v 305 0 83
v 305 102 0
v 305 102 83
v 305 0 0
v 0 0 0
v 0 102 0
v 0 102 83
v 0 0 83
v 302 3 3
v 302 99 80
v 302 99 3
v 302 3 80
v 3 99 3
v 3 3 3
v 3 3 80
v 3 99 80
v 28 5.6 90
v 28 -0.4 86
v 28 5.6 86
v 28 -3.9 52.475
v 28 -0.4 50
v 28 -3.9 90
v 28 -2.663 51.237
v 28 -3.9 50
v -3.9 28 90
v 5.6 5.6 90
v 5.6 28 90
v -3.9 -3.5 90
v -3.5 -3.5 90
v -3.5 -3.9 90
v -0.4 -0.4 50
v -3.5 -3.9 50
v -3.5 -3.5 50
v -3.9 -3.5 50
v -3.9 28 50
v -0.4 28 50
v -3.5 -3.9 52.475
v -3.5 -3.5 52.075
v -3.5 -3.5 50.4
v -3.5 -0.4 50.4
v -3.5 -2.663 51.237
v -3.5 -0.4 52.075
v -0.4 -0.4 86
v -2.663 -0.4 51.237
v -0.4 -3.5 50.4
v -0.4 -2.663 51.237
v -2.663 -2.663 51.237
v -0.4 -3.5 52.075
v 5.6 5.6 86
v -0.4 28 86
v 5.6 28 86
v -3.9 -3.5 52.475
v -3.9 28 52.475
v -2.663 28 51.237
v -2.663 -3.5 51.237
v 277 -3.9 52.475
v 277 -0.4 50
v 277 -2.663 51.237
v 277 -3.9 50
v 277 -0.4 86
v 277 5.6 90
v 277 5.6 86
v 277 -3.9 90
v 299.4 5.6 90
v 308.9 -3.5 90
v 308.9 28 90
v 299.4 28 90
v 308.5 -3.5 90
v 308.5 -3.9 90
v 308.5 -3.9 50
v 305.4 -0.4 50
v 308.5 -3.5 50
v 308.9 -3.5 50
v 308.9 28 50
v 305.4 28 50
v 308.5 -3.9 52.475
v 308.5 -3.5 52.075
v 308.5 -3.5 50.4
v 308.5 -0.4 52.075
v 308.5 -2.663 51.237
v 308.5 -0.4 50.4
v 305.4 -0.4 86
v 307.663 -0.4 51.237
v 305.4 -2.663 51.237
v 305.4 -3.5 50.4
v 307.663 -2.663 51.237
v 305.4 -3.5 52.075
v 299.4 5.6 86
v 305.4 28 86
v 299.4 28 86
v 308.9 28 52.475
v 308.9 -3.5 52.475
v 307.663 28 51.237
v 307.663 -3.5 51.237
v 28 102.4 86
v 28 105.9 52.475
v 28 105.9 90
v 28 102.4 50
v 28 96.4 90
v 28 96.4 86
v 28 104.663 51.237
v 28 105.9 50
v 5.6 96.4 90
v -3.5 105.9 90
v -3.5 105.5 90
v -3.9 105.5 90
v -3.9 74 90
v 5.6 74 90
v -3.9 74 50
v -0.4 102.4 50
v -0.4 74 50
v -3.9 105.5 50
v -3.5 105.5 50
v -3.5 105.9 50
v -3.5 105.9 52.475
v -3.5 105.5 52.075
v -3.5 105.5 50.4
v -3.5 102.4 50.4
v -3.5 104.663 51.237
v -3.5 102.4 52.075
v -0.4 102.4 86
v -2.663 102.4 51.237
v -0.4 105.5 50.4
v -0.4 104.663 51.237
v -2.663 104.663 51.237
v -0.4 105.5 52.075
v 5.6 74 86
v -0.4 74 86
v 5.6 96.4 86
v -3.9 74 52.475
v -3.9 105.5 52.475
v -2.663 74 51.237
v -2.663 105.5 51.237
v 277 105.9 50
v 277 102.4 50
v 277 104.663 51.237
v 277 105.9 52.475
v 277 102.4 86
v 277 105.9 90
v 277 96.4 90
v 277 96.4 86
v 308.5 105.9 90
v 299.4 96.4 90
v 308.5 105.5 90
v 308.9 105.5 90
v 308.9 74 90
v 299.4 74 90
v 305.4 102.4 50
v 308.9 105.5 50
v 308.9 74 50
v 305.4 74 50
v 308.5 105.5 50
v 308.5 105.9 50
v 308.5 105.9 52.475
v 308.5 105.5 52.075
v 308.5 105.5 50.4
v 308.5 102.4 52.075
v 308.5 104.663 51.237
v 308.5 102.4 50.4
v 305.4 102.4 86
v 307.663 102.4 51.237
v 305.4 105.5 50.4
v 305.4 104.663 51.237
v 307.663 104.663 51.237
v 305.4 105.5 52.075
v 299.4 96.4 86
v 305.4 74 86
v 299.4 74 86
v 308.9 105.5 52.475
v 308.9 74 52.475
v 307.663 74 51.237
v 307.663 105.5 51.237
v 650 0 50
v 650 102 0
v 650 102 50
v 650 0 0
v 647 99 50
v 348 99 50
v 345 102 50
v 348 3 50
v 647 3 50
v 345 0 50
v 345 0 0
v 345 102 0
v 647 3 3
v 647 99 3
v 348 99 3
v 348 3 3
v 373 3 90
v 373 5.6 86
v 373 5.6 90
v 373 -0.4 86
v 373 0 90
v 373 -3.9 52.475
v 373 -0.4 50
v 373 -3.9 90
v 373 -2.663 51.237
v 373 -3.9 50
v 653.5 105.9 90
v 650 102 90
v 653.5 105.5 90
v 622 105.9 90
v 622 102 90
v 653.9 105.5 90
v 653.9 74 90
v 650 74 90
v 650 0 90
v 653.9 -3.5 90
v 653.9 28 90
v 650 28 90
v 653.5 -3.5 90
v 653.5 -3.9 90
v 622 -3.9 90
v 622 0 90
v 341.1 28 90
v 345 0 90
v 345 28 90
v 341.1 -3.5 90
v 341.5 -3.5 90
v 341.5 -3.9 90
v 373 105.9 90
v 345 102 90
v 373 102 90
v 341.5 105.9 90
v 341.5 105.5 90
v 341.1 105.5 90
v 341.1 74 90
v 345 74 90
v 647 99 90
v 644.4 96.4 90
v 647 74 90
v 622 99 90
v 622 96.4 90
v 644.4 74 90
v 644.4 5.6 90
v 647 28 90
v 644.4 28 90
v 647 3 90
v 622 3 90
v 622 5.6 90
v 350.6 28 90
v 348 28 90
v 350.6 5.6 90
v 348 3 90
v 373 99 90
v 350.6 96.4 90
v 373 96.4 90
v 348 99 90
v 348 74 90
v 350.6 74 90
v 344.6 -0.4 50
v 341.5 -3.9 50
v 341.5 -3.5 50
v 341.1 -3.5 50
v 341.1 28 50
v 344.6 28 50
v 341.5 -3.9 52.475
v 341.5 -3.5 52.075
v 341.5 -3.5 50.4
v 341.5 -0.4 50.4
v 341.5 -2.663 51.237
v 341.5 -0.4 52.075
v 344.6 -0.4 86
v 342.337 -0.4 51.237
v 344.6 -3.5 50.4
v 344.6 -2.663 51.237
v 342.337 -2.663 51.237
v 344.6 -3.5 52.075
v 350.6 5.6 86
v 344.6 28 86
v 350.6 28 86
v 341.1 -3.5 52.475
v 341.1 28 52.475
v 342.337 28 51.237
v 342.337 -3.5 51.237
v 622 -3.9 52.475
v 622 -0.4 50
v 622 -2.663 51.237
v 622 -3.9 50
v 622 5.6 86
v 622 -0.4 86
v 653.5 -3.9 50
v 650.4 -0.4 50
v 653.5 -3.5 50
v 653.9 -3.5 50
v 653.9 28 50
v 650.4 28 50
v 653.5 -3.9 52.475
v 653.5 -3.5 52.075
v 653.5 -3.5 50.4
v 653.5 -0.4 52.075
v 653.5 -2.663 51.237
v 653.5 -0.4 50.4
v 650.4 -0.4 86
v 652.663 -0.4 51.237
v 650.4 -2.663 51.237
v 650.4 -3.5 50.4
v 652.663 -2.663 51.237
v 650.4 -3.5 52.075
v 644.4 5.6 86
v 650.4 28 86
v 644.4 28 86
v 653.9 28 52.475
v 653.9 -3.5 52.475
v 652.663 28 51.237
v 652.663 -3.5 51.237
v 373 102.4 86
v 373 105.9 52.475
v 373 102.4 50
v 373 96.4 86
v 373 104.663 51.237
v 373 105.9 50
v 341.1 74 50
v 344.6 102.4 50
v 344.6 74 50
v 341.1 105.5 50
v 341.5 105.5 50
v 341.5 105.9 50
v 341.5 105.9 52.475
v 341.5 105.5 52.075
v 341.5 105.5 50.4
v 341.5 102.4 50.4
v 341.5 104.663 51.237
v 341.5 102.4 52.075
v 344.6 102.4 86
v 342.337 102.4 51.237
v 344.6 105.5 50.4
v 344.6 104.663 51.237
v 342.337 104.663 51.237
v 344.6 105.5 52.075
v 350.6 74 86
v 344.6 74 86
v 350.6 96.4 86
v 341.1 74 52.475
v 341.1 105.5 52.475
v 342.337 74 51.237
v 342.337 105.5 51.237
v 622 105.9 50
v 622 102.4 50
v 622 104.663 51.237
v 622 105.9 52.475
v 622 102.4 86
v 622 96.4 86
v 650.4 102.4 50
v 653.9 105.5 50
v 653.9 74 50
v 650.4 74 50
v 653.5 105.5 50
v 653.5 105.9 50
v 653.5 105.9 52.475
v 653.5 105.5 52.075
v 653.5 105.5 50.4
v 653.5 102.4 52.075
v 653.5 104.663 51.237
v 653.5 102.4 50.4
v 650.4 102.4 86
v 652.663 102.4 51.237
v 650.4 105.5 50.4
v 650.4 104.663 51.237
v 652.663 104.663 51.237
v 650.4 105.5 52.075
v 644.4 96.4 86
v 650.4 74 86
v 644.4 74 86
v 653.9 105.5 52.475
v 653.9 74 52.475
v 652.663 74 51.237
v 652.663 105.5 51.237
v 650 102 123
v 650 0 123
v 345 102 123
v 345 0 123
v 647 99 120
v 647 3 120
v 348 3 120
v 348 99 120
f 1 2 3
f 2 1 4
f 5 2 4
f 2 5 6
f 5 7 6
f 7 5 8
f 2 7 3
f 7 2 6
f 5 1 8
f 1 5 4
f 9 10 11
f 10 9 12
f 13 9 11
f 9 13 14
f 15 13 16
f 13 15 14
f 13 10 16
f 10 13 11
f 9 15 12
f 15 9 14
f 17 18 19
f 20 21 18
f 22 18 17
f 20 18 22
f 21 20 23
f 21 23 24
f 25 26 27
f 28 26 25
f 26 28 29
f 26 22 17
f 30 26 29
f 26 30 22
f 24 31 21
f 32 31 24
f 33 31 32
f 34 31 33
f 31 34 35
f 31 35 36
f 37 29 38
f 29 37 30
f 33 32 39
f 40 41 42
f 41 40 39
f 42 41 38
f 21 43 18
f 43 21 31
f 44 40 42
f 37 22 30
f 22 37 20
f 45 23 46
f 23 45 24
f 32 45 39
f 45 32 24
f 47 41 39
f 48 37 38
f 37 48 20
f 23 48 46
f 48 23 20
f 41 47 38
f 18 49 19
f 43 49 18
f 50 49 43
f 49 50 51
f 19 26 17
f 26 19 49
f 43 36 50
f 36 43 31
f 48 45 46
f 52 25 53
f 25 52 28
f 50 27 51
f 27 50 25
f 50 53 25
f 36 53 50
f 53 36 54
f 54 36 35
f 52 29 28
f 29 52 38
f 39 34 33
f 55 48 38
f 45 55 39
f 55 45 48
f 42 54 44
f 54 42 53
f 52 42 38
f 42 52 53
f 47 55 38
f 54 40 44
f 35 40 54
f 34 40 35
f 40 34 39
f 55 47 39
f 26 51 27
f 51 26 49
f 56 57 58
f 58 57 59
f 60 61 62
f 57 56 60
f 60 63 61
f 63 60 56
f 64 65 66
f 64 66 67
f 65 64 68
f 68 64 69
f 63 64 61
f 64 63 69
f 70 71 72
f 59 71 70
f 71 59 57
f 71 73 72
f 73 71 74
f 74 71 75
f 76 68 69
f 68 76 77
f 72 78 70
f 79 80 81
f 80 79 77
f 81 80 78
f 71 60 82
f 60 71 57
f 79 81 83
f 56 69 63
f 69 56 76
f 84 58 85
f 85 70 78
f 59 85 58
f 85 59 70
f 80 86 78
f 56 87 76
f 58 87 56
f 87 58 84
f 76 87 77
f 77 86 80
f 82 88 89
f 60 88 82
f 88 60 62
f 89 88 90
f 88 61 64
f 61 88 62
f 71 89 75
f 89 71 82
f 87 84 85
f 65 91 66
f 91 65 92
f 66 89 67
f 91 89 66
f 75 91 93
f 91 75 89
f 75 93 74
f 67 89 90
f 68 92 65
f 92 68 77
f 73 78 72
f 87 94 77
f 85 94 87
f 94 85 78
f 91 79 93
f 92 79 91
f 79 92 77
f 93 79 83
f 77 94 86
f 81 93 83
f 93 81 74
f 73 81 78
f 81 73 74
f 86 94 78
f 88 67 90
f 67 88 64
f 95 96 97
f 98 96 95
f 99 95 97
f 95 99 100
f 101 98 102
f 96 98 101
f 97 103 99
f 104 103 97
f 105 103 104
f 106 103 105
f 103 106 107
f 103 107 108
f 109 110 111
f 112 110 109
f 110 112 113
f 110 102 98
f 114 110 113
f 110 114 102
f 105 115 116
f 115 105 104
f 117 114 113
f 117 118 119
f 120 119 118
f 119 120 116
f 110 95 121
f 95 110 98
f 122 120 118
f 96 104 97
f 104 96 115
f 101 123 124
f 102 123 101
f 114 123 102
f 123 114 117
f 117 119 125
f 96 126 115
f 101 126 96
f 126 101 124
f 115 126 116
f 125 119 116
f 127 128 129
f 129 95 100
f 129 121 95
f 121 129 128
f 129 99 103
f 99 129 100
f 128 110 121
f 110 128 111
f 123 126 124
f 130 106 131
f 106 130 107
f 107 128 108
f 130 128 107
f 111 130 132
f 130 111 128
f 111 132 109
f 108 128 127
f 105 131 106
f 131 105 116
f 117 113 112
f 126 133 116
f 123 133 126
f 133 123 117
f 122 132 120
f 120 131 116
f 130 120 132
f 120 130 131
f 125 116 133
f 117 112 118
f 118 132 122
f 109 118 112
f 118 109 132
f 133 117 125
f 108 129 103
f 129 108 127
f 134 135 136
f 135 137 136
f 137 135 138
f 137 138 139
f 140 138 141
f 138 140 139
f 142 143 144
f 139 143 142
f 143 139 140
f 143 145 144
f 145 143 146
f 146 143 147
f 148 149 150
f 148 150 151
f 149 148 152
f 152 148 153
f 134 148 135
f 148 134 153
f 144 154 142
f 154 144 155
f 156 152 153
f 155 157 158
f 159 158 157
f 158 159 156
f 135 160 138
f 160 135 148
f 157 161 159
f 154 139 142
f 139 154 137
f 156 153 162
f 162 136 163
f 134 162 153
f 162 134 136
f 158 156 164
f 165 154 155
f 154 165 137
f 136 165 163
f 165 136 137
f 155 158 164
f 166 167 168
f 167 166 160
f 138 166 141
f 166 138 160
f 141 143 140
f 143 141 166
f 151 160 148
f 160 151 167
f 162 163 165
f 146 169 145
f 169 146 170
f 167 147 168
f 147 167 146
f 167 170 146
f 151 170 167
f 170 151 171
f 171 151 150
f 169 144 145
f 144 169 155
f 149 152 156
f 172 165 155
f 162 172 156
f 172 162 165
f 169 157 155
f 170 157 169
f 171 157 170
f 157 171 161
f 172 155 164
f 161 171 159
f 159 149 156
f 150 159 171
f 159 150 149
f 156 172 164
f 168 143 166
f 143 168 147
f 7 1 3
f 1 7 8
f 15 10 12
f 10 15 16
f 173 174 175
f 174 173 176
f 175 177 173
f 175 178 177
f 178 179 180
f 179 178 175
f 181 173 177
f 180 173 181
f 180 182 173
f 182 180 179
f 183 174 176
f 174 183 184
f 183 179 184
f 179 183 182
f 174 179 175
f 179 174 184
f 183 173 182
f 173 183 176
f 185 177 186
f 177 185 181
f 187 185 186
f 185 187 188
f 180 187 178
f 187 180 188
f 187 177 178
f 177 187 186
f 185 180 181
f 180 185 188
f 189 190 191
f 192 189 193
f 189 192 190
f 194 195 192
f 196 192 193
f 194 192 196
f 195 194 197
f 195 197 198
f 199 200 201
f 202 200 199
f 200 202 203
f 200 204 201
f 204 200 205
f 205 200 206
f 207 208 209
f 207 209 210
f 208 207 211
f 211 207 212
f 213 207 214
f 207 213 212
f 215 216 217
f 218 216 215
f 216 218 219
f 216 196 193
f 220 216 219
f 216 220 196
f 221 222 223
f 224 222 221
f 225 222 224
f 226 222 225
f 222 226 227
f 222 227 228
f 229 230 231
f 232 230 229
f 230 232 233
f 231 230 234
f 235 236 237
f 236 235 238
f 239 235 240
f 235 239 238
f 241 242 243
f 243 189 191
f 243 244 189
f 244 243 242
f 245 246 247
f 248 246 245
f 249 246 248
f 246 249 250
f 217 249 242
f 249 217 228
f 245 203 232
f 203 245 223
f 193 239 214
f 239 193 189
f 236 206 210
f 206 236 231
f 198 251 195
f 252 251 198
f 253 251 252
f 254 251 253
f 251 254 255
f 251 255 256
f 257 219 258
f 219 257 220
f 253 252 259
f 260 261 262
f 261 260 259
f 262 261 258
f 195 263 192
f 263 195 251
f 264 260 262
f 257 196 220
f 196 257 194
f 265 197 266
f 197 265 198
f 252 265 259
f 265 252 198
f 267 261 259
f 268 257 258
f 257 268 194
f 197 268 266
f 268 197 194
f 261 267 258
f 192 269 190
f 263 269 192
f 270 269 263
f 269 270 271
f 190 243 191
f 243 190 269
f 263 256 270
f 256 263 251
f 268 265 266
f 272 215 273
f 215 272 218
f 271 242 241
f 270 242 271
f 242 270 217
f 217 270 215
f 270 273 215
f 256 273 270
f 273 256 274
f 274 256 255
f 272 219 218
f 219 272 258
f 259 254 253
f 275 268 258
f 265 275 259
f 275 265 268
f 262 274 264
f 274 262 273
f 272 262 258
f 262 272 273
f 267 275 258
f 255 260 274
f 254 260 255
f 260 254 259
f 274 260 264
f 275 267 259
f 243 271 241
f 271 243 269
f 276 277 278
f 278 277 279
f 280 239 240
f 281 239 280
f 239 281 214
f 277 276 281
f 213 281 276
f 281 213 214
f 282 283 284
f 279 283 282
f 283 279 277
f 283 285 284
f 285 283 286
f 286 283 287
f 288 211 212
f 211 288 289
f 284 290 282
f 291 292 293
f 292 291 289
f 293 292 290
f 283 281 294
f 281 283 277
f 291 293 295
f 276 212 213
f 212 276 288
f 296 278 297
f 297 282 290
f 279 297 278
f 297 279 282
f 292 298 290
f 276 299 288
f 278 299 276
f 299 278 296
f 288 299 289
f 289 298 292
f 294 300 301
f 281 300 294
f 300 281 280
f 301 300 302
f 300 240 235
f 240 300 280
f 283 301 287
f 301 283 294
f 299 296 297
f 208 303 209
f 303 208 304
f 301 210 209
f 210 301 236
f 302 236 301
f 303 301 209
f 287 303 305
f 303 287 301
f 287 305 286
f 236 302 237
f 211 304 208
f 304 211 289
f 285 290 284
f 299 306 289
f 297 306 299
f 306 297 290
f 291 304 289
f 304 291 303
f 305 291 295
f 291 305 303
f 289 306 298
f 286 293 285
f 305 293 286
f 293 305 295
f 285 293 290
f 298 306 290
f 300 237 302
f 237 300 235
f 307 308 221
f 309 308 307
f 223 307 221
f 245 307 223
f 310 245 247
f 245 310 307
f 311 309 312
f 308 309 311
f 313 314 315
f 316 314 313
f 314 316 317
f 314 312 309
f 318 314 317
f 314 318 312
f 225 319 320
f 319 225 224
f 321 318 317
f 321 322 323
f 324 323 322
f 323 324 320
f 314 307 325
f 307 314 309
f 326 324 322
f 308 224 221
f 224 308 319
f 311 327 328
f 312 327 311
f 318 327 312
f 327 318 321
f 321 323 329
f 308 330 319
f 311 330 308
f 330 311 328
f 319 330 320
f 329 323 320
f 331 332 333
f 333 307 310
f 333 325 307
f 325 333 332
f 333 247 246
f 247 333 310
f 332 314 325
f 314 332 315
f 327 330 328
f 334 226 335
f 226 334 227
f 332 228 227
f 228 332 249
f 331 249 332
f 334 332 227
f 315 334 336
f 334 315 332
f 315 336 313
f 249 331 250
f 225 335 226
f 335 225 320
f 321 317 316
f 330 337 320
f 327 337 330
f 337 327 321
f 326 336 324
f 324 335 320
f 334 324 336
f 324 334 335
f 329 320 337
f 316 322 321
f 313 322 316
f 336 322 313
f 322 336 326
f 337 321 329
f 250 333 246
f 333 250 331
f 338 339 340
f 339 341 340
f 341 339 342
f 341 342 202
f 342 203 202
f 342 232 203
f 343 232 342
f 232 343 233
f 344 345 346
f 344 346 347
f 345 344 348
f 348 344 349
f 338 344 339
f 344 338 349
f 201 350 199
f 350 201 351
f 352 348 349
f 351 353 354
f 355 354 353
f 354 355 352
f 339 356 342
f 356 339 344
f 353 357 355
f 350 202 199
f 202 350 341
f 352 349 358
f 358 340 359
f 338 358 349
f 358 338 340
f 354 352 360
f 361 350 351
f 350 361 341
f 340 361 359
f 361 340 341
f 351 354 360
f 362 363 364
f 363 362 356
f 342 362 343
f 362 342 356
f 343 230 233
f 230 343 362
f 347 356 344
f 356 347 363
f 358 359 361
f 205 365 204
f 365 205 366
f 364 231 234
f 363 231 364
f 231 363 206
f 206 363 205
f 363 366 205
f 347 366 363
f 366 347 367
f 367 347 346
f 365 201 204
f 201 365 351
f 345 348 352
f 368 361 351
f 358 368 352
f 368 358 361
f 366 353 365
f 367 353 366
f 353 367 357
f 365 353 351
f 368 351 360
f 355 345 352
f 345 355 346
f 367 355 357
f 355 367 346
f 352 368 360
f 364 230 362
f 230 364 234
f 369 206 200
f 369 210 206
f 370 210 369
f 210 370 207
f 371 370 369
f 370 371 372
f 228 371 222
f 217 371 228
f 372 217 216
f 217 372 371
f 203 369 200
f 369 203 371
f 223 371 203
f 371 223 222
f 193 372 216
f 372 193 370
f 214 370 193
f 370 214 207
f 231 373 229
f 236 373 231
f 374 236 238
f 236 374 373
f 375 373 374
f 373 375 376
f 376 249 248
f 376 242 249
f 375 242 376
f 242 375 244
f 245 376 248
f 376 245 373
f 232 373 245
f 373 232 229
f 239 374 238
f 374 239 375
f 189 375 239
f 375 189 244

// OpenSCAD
// 02_corner_clips.scad
// RETROFIT: Four L-shaped corner clips integral to the NEW tray.
// Each clip wraps around ONE corner of the top tray (grabbing two outer faces)
// and projects a horizontal shelf that hooks OVER the top rim at z=83.
// Engagement: push top tray straight down — clips flex slightly then snap.
// Release: squeeze opposing corner pairs inward slightly, lift top tray.
// TOP TRAY FIXED — NO geometry added to it.
//
// LEFT: ENGAGED  |  RIGHT: EXPLODED

TW = 305; TD = 102; TH = 33;
NW = 305; ND = 102; NH = 50;
wall = 3;

// clip geometry
cl_leg   = 28;   // length of each L-leg along the tray edge
cl_t     = 3.5; // clip arm wall thickness
cl_h     = TH + 7;  // clip height above z=NH (must clear top tray TH=33)
lip_ext  = 6;   // rim lip horizontal reach inward
lip_t    = 4;   // rim lip vertical thickness
gap      = 0.4; // clearance between clip inner face and top tray outer face
// lead-in chamfer on clip inner bottom edge (aids snap-in)
chamfer  = 3;

C_new  = "#1565C0";
C_top  = "#90A4AE";
C_clip = "#C62828";  // deep red — corner clips

sep = NW + 40;

module new_tray_body() {
    color(C_new)
    difference() {
        cube([NW, ND, NH]);
        translate([wall, wall, wall])
            cube([NW-2*wall, ND-2*wall, NH]);
    }
}

module top_tray_body(dz=0) {
    color(C_top)
    translate([0, 0, NH + dz])
    difference() {
        cube([TW, TD, TH]);
        translate([wall, wall, 0])
            cube([TW-2*wall, TD-2*wall, TH-wall]);
    }
}

// Single L-clip, placed at the x=0,y=0 corner.
// The L wraps: one arm along +X (covering front face y<0),
//              one arm along +Y (covering left face x<0).
// Both arms have a rim-lip at the top.
module corner_clip() {
    color(C_clip)
    union() {
        // X-arm: covers outside of front face (y=0) for length cl_leg
        // outer face of arm at y = -(gap + cl_t), inner face at y = -gap
        translate([-cl_t, -(cl_t + gap), 0]) {
            difference() {
                cube([cl_leg + cl_t, cl_t, cl_h]);
                // lead-in chamfer on inner bottom
                translate([0, 0, 0])
                    rotate([45, 0, 0])
                    translate([0, -cl_t, 0])
                    cube([cl_leg + cl_t, cl_t*1.5, cl_t*1.5]);
            }
            // rim lip over top — extends inward (+Y)
            translate([0, 0, cl_h - lip_t])
                cube([cl_leg + cl_t, cl_t + lip_ext, lip_t]);
        }

        // Y-arm: covers outside of left face (x=0) for length cl_leg
        translate([-(cl_t + gap), -cl_t, 0]) {
            difference() {
                cube([cl_t, cl_leg + cl_t, cl_h]);
                translate([0, 0, 0])
                    rotate([0, -45, 0])
                    translate([-cl_t, 0, 0])
                    cube([cl_t*1.5, cl_leg + cl_t, cl_t*1.5]);
            }
            // rim lip
            translate([0, 0, cl_h - lip_t])
                cube([cl_t + lip_ext, cl_leg + cl_t, lip_t]);
        }
    }
}

module all_clips() {
    // Front-left corner (x=0, y=0)
    translate([0, 0, NH]) corner_clip();

    // Front-right corner (x=NW, y=0) — mirror X
    translate([NW, 0, NH]) mirror([1,0,0]) corner_clip();

    // Back-left corner (x=0, y=ND) — mirror Y
    translate([0, ND, NH]) mirror([0,1,0]) corner_clip();

    // Back-right corner (x=NW, y=ND) — mirror X+Y
    translate([NW, ND, NH]) mirror([1,0,0]) mirror([0,1,0]) corner_clip();
}

// ENGAGED
translate([0,0,0]) {
    new_tray_body();
    all_clips();
    top_tray_body(0);
}

// EXPLODED
translate([sep,0,0]) {
    new_tray_body();
    all_clips();
    top_tray_body(40);
}
